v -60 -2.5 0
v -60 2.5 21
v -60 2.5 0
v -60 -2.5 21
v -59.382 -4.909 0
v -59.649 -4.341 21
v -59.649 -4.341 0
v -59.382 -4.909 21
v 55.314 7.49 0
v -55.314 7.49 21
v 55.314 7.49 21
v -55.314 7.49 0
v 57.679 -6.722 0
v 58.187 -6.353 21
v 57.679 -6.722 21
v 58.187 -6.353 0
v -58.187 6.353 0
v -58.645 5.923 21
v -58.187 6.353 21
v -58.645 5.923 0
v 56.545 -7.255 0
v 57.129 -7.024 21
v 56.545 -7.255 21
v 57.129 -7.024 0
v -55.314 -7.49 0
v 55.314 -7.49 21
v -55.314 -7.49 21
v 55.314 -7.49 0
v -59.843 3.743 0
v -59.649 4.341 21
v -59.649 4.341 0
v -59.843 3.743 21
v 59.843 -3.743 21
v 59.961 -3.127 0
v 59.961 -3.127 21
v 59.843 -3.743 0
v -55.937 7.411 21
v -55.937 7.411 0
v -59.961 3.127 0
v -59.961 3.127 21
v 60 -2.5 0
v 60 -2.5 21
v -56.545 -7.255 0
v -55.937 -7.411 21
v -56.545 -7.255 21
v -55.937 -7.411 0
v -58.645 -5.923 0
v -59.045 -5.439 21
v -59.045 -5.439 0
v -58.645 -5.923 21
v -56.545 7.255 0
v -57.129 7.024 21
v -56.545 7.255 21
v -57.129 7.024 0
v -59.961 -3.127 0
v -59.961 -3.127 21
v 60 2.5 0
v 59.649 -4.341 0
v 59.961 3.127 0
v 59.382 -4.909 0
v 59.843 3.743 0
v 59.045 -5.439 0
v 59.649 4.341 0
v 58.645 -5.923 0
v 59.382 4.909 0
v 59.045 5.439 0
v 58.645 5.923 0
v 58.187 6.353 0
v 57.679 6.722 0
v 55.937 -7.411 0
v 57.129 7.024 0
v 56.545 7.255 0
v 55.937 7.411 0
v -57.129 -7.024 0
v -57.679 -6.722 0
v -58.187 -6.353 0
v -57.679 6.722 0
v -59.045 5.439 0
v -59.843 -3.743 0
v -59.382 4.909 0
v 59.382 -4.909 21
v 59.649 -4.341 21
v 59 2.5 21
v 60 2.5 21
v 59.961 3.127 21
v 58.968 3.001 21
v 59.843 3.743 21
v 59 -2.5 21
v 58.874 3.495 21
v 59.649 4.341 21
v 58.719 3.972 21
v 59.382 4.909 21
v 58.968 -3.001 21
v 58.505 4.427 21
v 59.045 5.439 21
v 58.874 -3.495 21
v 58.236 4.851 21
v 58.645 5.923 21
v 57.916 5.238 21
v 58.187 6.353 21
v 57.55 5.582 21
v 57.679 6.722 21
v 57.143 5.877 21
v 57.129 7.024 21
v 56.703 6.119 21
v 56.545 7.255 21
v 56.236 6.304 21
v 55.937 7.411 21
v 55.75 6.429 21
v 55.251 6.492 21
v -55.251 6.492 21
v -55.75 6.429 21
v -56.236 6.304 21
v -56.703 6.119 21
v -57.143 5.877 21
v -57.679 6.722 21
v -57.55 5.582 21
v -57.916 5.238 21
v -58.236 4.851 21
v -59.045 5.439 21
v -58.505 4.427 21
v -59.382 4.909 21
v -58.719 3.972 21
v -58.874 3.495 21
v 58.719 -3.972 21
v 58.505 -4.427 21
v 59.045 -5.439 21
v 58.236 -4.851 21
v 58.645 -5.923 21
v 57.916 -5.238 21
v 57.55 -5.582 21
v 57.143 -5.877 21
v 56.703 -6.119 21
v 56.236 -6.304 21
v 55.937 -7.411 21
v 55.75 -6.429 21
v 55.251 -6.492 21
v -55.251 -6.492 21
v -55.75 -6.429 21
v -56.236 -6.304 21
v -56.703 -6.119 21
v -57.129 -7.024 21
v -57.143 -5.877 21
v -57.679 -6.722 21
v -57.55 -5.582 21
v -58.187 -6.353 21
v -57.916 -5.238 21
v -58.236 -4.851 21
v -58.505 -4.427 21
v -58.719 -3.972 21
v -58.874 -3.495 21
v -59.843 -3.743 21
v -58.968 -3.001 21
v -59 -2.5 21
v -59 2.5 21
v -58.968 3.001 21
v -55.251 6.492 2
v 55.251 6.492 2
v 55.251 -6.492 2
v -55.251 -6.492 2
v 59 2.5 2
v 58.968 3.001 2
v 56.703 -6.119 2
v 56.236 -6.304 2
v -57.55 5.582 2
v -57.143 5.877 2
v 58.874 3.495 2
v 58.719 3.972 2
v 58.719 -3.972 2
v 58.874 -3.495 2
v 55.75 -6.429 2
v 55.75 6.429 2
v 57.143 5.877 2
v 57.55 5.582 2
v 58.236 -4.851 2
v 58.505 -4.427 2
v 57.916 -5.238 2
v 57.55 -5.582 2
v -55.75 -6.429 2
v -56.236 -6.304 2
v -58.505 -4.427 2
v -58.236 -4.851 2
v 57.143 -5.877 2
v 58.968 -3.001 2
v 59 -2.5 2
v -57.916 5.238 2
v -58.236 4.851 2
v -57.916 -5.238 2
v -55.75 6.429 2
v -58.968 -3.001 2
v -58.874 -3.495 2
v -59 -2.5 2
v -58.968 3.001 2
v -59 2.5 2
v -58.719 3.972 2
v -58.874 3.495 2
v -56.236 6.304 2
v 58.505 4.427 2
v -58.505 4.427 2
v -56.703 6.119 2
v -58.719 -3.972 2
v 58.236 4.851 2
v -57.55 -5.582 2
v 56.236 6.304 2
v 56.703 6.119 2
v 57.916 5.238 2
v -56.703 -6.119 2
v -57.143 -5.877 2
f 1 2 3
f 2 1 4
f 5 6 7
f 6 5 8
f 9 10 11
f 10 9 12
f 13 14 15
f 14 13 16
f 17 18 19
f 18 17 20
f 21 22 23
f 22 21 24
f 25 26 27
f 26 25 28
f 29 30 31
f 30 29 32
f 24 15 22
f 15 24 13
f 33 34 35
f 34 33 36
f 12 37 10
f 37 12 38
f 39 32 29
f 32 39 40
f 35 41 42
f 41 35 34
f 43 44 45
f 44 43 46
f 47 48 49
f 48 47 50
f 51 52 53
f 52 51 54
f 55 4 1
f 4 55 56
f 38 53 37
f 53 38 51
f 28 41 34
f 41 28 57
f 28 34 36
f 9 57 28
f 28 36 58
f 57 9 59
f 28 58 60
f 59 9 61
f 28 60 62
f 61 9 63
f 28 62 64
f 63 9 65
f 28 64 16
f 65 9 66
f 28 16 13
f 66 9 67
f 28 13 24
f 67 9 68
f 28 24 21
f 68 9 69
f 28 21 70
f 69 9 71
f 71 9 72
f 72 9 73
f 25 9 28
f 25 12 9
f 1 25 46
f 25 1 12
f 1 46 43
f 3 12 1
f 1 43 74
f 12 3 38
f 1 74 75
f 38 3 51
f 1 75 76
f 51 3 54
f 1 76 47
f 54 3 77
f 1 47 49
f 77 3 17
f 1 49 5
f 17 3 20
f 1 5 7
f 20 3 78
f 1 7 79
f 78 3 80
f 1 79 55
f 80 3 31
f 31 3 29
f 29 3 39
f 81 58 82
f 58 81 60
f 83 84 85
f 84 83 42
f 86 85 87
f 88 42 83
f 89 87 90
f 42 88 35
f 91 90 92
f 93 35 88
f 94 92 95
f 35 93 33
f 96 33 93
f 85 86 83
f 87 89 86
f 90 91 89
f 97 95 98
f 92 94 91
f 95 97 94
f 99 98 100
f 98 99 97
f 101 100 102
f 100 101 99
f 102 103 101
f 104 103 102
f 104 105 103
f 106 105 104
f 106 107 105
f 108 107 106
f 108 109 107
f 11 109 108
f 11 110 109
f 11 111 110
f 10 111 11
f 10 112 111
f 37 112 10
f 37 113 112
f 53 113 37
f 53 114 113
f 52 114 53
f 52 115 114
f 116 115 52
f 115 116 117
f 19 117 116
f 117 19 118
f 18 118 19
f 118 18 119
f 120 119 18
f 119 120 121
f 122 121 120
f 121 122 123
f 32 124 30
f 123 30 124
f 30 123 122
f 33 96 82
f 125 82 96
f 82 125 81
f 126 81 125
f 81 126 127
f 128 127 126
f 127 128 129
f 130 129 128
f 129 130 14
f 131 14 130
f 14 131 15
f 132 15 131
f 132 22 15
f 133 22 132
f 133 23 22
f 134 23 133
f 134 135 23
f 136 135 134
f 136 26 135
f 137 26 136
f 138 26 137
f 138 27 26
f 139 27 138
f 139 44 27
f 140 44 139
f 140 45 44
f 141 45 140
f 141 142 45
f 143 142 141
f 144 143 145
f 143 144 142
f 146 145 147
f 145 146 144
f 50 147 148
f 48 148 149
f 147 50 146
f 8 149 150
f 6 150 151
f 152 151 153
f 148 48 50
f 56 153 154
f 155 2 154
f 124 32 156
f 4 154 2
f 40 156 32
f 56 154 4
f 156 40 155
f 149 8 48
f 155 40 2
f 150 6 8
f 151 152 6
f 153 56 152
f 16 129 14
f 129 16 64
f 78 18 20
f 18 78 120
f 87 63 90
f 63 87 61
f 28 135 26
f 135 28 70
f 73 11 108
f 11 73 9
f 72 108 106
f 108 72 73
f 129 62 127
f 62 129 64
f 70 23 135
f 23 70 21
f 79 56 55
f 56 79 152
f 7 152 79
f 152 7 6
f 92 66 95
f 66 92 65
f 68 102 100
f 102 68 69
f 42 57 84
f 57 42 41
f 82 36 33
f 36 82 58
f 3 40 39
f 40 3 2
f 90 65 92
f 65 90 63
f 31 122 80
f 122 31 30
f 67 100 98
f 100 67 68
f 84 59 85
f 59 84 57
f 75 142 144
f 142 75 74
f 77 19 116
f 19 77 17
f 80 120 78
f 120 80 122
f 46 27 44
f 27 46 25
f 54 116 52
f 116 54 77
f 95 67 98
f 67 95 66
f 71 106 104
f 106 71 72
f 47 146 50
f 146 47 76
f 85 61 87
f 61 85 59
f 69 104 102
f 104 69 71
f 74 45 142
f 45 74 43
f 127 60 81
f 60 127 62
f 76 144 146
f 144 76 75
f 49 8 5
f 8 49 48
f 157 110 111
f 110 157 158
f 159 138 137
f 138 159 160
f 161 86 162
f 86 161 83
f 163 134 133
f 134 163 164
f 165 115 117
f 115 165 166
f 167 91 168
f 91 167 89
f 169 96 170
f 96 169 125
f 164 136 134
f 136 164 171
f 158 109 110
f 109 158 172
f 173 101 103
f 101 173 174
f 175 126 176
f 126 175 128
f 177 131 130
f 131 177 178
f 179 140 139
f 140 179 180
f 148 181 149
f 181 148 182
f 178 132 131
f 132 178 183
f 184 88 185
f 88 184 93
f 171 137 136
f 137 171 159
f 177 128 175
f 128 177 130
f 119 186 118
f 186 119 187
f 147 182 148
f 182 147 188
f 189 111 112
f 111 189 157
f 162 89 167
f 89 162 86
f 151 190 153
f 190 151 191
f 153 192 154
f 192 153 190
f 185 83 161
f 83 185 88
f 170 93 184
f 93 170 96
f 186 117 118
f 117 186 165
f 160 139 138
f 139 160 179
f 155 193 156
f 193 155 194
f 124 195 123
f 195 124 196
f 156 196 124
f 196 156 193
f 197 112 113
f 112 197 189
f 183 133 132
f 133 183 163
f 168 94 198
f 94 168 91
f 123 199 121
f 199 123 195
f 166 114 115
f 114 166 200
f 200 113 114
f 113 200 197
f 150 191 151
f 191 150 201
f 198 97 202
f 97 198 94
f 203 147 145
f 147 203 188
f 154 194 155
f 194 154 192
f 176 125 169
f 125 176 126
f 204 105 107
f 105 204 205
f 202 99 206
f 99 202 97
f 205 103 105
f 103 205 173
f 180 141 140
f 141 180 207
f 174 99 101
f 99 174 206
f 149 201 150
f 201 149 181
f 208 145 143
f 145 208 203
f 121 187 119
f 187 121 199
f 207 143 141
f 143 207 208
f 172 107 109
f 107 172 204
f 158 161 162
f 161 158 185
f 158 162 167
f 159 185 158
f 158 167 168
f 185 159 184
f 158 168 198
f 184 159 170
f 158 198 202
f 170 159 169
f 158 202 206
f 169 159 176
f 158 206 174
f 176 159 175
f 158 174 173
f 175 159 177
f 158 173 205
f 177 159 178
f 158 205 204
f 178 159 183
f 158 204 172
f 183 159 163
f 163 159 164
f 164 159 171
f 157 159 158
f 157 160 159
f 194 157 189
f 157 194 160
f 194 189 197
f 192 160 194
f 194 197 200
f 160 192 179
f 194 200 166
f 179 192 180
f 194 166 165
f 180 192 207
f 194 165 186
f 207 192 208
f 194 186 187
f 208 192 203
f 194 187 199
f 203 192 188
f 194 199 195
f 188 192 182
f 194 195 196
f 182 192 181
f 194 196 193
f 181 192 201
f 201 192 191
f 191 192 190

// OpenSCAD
$fn = 50;


difference() {
	union() {
		hull() {
			translate(v = [-55.0000000000, 2.5000000000, 0]) {
				cylinder(h = 21, r = 5);
			}
			translate(v = [55.0000000000, 2.5000000000, 0]) {
				cylinder(h = 21, r = 5);
			}
			translate(v = [-55.0000000000, -2.5000000000, 0]) {
				cylinder(h = 21, r = 5);
			}
			translate(v = [55.0000000000, -2.5000000000, 0]) {
				cylinder(h = 21, r = 5);
			}
		}
	}
	union() {
		translate(v = [0, 0, 2]) {
			hull() {
				translate(v = [-55.0000000000, 2.5000000000, 0]) {
					cylinder(h = 19, r = 4);
				}
				translate(v = [55.0000000000, 2.5000000000, 0]) {
					cylinder(h = 19, r = 4);
				}
				translate(v = [-55.0000000000, -2.5000000000, 0]) {
					cylinder(h = 19, r = 4);
				}
				translate(v = [55.0000000000, -2.5000000000, 0]) {
					cylinder(h = 19, r = 4);
				}
			}
		}
	}
}
